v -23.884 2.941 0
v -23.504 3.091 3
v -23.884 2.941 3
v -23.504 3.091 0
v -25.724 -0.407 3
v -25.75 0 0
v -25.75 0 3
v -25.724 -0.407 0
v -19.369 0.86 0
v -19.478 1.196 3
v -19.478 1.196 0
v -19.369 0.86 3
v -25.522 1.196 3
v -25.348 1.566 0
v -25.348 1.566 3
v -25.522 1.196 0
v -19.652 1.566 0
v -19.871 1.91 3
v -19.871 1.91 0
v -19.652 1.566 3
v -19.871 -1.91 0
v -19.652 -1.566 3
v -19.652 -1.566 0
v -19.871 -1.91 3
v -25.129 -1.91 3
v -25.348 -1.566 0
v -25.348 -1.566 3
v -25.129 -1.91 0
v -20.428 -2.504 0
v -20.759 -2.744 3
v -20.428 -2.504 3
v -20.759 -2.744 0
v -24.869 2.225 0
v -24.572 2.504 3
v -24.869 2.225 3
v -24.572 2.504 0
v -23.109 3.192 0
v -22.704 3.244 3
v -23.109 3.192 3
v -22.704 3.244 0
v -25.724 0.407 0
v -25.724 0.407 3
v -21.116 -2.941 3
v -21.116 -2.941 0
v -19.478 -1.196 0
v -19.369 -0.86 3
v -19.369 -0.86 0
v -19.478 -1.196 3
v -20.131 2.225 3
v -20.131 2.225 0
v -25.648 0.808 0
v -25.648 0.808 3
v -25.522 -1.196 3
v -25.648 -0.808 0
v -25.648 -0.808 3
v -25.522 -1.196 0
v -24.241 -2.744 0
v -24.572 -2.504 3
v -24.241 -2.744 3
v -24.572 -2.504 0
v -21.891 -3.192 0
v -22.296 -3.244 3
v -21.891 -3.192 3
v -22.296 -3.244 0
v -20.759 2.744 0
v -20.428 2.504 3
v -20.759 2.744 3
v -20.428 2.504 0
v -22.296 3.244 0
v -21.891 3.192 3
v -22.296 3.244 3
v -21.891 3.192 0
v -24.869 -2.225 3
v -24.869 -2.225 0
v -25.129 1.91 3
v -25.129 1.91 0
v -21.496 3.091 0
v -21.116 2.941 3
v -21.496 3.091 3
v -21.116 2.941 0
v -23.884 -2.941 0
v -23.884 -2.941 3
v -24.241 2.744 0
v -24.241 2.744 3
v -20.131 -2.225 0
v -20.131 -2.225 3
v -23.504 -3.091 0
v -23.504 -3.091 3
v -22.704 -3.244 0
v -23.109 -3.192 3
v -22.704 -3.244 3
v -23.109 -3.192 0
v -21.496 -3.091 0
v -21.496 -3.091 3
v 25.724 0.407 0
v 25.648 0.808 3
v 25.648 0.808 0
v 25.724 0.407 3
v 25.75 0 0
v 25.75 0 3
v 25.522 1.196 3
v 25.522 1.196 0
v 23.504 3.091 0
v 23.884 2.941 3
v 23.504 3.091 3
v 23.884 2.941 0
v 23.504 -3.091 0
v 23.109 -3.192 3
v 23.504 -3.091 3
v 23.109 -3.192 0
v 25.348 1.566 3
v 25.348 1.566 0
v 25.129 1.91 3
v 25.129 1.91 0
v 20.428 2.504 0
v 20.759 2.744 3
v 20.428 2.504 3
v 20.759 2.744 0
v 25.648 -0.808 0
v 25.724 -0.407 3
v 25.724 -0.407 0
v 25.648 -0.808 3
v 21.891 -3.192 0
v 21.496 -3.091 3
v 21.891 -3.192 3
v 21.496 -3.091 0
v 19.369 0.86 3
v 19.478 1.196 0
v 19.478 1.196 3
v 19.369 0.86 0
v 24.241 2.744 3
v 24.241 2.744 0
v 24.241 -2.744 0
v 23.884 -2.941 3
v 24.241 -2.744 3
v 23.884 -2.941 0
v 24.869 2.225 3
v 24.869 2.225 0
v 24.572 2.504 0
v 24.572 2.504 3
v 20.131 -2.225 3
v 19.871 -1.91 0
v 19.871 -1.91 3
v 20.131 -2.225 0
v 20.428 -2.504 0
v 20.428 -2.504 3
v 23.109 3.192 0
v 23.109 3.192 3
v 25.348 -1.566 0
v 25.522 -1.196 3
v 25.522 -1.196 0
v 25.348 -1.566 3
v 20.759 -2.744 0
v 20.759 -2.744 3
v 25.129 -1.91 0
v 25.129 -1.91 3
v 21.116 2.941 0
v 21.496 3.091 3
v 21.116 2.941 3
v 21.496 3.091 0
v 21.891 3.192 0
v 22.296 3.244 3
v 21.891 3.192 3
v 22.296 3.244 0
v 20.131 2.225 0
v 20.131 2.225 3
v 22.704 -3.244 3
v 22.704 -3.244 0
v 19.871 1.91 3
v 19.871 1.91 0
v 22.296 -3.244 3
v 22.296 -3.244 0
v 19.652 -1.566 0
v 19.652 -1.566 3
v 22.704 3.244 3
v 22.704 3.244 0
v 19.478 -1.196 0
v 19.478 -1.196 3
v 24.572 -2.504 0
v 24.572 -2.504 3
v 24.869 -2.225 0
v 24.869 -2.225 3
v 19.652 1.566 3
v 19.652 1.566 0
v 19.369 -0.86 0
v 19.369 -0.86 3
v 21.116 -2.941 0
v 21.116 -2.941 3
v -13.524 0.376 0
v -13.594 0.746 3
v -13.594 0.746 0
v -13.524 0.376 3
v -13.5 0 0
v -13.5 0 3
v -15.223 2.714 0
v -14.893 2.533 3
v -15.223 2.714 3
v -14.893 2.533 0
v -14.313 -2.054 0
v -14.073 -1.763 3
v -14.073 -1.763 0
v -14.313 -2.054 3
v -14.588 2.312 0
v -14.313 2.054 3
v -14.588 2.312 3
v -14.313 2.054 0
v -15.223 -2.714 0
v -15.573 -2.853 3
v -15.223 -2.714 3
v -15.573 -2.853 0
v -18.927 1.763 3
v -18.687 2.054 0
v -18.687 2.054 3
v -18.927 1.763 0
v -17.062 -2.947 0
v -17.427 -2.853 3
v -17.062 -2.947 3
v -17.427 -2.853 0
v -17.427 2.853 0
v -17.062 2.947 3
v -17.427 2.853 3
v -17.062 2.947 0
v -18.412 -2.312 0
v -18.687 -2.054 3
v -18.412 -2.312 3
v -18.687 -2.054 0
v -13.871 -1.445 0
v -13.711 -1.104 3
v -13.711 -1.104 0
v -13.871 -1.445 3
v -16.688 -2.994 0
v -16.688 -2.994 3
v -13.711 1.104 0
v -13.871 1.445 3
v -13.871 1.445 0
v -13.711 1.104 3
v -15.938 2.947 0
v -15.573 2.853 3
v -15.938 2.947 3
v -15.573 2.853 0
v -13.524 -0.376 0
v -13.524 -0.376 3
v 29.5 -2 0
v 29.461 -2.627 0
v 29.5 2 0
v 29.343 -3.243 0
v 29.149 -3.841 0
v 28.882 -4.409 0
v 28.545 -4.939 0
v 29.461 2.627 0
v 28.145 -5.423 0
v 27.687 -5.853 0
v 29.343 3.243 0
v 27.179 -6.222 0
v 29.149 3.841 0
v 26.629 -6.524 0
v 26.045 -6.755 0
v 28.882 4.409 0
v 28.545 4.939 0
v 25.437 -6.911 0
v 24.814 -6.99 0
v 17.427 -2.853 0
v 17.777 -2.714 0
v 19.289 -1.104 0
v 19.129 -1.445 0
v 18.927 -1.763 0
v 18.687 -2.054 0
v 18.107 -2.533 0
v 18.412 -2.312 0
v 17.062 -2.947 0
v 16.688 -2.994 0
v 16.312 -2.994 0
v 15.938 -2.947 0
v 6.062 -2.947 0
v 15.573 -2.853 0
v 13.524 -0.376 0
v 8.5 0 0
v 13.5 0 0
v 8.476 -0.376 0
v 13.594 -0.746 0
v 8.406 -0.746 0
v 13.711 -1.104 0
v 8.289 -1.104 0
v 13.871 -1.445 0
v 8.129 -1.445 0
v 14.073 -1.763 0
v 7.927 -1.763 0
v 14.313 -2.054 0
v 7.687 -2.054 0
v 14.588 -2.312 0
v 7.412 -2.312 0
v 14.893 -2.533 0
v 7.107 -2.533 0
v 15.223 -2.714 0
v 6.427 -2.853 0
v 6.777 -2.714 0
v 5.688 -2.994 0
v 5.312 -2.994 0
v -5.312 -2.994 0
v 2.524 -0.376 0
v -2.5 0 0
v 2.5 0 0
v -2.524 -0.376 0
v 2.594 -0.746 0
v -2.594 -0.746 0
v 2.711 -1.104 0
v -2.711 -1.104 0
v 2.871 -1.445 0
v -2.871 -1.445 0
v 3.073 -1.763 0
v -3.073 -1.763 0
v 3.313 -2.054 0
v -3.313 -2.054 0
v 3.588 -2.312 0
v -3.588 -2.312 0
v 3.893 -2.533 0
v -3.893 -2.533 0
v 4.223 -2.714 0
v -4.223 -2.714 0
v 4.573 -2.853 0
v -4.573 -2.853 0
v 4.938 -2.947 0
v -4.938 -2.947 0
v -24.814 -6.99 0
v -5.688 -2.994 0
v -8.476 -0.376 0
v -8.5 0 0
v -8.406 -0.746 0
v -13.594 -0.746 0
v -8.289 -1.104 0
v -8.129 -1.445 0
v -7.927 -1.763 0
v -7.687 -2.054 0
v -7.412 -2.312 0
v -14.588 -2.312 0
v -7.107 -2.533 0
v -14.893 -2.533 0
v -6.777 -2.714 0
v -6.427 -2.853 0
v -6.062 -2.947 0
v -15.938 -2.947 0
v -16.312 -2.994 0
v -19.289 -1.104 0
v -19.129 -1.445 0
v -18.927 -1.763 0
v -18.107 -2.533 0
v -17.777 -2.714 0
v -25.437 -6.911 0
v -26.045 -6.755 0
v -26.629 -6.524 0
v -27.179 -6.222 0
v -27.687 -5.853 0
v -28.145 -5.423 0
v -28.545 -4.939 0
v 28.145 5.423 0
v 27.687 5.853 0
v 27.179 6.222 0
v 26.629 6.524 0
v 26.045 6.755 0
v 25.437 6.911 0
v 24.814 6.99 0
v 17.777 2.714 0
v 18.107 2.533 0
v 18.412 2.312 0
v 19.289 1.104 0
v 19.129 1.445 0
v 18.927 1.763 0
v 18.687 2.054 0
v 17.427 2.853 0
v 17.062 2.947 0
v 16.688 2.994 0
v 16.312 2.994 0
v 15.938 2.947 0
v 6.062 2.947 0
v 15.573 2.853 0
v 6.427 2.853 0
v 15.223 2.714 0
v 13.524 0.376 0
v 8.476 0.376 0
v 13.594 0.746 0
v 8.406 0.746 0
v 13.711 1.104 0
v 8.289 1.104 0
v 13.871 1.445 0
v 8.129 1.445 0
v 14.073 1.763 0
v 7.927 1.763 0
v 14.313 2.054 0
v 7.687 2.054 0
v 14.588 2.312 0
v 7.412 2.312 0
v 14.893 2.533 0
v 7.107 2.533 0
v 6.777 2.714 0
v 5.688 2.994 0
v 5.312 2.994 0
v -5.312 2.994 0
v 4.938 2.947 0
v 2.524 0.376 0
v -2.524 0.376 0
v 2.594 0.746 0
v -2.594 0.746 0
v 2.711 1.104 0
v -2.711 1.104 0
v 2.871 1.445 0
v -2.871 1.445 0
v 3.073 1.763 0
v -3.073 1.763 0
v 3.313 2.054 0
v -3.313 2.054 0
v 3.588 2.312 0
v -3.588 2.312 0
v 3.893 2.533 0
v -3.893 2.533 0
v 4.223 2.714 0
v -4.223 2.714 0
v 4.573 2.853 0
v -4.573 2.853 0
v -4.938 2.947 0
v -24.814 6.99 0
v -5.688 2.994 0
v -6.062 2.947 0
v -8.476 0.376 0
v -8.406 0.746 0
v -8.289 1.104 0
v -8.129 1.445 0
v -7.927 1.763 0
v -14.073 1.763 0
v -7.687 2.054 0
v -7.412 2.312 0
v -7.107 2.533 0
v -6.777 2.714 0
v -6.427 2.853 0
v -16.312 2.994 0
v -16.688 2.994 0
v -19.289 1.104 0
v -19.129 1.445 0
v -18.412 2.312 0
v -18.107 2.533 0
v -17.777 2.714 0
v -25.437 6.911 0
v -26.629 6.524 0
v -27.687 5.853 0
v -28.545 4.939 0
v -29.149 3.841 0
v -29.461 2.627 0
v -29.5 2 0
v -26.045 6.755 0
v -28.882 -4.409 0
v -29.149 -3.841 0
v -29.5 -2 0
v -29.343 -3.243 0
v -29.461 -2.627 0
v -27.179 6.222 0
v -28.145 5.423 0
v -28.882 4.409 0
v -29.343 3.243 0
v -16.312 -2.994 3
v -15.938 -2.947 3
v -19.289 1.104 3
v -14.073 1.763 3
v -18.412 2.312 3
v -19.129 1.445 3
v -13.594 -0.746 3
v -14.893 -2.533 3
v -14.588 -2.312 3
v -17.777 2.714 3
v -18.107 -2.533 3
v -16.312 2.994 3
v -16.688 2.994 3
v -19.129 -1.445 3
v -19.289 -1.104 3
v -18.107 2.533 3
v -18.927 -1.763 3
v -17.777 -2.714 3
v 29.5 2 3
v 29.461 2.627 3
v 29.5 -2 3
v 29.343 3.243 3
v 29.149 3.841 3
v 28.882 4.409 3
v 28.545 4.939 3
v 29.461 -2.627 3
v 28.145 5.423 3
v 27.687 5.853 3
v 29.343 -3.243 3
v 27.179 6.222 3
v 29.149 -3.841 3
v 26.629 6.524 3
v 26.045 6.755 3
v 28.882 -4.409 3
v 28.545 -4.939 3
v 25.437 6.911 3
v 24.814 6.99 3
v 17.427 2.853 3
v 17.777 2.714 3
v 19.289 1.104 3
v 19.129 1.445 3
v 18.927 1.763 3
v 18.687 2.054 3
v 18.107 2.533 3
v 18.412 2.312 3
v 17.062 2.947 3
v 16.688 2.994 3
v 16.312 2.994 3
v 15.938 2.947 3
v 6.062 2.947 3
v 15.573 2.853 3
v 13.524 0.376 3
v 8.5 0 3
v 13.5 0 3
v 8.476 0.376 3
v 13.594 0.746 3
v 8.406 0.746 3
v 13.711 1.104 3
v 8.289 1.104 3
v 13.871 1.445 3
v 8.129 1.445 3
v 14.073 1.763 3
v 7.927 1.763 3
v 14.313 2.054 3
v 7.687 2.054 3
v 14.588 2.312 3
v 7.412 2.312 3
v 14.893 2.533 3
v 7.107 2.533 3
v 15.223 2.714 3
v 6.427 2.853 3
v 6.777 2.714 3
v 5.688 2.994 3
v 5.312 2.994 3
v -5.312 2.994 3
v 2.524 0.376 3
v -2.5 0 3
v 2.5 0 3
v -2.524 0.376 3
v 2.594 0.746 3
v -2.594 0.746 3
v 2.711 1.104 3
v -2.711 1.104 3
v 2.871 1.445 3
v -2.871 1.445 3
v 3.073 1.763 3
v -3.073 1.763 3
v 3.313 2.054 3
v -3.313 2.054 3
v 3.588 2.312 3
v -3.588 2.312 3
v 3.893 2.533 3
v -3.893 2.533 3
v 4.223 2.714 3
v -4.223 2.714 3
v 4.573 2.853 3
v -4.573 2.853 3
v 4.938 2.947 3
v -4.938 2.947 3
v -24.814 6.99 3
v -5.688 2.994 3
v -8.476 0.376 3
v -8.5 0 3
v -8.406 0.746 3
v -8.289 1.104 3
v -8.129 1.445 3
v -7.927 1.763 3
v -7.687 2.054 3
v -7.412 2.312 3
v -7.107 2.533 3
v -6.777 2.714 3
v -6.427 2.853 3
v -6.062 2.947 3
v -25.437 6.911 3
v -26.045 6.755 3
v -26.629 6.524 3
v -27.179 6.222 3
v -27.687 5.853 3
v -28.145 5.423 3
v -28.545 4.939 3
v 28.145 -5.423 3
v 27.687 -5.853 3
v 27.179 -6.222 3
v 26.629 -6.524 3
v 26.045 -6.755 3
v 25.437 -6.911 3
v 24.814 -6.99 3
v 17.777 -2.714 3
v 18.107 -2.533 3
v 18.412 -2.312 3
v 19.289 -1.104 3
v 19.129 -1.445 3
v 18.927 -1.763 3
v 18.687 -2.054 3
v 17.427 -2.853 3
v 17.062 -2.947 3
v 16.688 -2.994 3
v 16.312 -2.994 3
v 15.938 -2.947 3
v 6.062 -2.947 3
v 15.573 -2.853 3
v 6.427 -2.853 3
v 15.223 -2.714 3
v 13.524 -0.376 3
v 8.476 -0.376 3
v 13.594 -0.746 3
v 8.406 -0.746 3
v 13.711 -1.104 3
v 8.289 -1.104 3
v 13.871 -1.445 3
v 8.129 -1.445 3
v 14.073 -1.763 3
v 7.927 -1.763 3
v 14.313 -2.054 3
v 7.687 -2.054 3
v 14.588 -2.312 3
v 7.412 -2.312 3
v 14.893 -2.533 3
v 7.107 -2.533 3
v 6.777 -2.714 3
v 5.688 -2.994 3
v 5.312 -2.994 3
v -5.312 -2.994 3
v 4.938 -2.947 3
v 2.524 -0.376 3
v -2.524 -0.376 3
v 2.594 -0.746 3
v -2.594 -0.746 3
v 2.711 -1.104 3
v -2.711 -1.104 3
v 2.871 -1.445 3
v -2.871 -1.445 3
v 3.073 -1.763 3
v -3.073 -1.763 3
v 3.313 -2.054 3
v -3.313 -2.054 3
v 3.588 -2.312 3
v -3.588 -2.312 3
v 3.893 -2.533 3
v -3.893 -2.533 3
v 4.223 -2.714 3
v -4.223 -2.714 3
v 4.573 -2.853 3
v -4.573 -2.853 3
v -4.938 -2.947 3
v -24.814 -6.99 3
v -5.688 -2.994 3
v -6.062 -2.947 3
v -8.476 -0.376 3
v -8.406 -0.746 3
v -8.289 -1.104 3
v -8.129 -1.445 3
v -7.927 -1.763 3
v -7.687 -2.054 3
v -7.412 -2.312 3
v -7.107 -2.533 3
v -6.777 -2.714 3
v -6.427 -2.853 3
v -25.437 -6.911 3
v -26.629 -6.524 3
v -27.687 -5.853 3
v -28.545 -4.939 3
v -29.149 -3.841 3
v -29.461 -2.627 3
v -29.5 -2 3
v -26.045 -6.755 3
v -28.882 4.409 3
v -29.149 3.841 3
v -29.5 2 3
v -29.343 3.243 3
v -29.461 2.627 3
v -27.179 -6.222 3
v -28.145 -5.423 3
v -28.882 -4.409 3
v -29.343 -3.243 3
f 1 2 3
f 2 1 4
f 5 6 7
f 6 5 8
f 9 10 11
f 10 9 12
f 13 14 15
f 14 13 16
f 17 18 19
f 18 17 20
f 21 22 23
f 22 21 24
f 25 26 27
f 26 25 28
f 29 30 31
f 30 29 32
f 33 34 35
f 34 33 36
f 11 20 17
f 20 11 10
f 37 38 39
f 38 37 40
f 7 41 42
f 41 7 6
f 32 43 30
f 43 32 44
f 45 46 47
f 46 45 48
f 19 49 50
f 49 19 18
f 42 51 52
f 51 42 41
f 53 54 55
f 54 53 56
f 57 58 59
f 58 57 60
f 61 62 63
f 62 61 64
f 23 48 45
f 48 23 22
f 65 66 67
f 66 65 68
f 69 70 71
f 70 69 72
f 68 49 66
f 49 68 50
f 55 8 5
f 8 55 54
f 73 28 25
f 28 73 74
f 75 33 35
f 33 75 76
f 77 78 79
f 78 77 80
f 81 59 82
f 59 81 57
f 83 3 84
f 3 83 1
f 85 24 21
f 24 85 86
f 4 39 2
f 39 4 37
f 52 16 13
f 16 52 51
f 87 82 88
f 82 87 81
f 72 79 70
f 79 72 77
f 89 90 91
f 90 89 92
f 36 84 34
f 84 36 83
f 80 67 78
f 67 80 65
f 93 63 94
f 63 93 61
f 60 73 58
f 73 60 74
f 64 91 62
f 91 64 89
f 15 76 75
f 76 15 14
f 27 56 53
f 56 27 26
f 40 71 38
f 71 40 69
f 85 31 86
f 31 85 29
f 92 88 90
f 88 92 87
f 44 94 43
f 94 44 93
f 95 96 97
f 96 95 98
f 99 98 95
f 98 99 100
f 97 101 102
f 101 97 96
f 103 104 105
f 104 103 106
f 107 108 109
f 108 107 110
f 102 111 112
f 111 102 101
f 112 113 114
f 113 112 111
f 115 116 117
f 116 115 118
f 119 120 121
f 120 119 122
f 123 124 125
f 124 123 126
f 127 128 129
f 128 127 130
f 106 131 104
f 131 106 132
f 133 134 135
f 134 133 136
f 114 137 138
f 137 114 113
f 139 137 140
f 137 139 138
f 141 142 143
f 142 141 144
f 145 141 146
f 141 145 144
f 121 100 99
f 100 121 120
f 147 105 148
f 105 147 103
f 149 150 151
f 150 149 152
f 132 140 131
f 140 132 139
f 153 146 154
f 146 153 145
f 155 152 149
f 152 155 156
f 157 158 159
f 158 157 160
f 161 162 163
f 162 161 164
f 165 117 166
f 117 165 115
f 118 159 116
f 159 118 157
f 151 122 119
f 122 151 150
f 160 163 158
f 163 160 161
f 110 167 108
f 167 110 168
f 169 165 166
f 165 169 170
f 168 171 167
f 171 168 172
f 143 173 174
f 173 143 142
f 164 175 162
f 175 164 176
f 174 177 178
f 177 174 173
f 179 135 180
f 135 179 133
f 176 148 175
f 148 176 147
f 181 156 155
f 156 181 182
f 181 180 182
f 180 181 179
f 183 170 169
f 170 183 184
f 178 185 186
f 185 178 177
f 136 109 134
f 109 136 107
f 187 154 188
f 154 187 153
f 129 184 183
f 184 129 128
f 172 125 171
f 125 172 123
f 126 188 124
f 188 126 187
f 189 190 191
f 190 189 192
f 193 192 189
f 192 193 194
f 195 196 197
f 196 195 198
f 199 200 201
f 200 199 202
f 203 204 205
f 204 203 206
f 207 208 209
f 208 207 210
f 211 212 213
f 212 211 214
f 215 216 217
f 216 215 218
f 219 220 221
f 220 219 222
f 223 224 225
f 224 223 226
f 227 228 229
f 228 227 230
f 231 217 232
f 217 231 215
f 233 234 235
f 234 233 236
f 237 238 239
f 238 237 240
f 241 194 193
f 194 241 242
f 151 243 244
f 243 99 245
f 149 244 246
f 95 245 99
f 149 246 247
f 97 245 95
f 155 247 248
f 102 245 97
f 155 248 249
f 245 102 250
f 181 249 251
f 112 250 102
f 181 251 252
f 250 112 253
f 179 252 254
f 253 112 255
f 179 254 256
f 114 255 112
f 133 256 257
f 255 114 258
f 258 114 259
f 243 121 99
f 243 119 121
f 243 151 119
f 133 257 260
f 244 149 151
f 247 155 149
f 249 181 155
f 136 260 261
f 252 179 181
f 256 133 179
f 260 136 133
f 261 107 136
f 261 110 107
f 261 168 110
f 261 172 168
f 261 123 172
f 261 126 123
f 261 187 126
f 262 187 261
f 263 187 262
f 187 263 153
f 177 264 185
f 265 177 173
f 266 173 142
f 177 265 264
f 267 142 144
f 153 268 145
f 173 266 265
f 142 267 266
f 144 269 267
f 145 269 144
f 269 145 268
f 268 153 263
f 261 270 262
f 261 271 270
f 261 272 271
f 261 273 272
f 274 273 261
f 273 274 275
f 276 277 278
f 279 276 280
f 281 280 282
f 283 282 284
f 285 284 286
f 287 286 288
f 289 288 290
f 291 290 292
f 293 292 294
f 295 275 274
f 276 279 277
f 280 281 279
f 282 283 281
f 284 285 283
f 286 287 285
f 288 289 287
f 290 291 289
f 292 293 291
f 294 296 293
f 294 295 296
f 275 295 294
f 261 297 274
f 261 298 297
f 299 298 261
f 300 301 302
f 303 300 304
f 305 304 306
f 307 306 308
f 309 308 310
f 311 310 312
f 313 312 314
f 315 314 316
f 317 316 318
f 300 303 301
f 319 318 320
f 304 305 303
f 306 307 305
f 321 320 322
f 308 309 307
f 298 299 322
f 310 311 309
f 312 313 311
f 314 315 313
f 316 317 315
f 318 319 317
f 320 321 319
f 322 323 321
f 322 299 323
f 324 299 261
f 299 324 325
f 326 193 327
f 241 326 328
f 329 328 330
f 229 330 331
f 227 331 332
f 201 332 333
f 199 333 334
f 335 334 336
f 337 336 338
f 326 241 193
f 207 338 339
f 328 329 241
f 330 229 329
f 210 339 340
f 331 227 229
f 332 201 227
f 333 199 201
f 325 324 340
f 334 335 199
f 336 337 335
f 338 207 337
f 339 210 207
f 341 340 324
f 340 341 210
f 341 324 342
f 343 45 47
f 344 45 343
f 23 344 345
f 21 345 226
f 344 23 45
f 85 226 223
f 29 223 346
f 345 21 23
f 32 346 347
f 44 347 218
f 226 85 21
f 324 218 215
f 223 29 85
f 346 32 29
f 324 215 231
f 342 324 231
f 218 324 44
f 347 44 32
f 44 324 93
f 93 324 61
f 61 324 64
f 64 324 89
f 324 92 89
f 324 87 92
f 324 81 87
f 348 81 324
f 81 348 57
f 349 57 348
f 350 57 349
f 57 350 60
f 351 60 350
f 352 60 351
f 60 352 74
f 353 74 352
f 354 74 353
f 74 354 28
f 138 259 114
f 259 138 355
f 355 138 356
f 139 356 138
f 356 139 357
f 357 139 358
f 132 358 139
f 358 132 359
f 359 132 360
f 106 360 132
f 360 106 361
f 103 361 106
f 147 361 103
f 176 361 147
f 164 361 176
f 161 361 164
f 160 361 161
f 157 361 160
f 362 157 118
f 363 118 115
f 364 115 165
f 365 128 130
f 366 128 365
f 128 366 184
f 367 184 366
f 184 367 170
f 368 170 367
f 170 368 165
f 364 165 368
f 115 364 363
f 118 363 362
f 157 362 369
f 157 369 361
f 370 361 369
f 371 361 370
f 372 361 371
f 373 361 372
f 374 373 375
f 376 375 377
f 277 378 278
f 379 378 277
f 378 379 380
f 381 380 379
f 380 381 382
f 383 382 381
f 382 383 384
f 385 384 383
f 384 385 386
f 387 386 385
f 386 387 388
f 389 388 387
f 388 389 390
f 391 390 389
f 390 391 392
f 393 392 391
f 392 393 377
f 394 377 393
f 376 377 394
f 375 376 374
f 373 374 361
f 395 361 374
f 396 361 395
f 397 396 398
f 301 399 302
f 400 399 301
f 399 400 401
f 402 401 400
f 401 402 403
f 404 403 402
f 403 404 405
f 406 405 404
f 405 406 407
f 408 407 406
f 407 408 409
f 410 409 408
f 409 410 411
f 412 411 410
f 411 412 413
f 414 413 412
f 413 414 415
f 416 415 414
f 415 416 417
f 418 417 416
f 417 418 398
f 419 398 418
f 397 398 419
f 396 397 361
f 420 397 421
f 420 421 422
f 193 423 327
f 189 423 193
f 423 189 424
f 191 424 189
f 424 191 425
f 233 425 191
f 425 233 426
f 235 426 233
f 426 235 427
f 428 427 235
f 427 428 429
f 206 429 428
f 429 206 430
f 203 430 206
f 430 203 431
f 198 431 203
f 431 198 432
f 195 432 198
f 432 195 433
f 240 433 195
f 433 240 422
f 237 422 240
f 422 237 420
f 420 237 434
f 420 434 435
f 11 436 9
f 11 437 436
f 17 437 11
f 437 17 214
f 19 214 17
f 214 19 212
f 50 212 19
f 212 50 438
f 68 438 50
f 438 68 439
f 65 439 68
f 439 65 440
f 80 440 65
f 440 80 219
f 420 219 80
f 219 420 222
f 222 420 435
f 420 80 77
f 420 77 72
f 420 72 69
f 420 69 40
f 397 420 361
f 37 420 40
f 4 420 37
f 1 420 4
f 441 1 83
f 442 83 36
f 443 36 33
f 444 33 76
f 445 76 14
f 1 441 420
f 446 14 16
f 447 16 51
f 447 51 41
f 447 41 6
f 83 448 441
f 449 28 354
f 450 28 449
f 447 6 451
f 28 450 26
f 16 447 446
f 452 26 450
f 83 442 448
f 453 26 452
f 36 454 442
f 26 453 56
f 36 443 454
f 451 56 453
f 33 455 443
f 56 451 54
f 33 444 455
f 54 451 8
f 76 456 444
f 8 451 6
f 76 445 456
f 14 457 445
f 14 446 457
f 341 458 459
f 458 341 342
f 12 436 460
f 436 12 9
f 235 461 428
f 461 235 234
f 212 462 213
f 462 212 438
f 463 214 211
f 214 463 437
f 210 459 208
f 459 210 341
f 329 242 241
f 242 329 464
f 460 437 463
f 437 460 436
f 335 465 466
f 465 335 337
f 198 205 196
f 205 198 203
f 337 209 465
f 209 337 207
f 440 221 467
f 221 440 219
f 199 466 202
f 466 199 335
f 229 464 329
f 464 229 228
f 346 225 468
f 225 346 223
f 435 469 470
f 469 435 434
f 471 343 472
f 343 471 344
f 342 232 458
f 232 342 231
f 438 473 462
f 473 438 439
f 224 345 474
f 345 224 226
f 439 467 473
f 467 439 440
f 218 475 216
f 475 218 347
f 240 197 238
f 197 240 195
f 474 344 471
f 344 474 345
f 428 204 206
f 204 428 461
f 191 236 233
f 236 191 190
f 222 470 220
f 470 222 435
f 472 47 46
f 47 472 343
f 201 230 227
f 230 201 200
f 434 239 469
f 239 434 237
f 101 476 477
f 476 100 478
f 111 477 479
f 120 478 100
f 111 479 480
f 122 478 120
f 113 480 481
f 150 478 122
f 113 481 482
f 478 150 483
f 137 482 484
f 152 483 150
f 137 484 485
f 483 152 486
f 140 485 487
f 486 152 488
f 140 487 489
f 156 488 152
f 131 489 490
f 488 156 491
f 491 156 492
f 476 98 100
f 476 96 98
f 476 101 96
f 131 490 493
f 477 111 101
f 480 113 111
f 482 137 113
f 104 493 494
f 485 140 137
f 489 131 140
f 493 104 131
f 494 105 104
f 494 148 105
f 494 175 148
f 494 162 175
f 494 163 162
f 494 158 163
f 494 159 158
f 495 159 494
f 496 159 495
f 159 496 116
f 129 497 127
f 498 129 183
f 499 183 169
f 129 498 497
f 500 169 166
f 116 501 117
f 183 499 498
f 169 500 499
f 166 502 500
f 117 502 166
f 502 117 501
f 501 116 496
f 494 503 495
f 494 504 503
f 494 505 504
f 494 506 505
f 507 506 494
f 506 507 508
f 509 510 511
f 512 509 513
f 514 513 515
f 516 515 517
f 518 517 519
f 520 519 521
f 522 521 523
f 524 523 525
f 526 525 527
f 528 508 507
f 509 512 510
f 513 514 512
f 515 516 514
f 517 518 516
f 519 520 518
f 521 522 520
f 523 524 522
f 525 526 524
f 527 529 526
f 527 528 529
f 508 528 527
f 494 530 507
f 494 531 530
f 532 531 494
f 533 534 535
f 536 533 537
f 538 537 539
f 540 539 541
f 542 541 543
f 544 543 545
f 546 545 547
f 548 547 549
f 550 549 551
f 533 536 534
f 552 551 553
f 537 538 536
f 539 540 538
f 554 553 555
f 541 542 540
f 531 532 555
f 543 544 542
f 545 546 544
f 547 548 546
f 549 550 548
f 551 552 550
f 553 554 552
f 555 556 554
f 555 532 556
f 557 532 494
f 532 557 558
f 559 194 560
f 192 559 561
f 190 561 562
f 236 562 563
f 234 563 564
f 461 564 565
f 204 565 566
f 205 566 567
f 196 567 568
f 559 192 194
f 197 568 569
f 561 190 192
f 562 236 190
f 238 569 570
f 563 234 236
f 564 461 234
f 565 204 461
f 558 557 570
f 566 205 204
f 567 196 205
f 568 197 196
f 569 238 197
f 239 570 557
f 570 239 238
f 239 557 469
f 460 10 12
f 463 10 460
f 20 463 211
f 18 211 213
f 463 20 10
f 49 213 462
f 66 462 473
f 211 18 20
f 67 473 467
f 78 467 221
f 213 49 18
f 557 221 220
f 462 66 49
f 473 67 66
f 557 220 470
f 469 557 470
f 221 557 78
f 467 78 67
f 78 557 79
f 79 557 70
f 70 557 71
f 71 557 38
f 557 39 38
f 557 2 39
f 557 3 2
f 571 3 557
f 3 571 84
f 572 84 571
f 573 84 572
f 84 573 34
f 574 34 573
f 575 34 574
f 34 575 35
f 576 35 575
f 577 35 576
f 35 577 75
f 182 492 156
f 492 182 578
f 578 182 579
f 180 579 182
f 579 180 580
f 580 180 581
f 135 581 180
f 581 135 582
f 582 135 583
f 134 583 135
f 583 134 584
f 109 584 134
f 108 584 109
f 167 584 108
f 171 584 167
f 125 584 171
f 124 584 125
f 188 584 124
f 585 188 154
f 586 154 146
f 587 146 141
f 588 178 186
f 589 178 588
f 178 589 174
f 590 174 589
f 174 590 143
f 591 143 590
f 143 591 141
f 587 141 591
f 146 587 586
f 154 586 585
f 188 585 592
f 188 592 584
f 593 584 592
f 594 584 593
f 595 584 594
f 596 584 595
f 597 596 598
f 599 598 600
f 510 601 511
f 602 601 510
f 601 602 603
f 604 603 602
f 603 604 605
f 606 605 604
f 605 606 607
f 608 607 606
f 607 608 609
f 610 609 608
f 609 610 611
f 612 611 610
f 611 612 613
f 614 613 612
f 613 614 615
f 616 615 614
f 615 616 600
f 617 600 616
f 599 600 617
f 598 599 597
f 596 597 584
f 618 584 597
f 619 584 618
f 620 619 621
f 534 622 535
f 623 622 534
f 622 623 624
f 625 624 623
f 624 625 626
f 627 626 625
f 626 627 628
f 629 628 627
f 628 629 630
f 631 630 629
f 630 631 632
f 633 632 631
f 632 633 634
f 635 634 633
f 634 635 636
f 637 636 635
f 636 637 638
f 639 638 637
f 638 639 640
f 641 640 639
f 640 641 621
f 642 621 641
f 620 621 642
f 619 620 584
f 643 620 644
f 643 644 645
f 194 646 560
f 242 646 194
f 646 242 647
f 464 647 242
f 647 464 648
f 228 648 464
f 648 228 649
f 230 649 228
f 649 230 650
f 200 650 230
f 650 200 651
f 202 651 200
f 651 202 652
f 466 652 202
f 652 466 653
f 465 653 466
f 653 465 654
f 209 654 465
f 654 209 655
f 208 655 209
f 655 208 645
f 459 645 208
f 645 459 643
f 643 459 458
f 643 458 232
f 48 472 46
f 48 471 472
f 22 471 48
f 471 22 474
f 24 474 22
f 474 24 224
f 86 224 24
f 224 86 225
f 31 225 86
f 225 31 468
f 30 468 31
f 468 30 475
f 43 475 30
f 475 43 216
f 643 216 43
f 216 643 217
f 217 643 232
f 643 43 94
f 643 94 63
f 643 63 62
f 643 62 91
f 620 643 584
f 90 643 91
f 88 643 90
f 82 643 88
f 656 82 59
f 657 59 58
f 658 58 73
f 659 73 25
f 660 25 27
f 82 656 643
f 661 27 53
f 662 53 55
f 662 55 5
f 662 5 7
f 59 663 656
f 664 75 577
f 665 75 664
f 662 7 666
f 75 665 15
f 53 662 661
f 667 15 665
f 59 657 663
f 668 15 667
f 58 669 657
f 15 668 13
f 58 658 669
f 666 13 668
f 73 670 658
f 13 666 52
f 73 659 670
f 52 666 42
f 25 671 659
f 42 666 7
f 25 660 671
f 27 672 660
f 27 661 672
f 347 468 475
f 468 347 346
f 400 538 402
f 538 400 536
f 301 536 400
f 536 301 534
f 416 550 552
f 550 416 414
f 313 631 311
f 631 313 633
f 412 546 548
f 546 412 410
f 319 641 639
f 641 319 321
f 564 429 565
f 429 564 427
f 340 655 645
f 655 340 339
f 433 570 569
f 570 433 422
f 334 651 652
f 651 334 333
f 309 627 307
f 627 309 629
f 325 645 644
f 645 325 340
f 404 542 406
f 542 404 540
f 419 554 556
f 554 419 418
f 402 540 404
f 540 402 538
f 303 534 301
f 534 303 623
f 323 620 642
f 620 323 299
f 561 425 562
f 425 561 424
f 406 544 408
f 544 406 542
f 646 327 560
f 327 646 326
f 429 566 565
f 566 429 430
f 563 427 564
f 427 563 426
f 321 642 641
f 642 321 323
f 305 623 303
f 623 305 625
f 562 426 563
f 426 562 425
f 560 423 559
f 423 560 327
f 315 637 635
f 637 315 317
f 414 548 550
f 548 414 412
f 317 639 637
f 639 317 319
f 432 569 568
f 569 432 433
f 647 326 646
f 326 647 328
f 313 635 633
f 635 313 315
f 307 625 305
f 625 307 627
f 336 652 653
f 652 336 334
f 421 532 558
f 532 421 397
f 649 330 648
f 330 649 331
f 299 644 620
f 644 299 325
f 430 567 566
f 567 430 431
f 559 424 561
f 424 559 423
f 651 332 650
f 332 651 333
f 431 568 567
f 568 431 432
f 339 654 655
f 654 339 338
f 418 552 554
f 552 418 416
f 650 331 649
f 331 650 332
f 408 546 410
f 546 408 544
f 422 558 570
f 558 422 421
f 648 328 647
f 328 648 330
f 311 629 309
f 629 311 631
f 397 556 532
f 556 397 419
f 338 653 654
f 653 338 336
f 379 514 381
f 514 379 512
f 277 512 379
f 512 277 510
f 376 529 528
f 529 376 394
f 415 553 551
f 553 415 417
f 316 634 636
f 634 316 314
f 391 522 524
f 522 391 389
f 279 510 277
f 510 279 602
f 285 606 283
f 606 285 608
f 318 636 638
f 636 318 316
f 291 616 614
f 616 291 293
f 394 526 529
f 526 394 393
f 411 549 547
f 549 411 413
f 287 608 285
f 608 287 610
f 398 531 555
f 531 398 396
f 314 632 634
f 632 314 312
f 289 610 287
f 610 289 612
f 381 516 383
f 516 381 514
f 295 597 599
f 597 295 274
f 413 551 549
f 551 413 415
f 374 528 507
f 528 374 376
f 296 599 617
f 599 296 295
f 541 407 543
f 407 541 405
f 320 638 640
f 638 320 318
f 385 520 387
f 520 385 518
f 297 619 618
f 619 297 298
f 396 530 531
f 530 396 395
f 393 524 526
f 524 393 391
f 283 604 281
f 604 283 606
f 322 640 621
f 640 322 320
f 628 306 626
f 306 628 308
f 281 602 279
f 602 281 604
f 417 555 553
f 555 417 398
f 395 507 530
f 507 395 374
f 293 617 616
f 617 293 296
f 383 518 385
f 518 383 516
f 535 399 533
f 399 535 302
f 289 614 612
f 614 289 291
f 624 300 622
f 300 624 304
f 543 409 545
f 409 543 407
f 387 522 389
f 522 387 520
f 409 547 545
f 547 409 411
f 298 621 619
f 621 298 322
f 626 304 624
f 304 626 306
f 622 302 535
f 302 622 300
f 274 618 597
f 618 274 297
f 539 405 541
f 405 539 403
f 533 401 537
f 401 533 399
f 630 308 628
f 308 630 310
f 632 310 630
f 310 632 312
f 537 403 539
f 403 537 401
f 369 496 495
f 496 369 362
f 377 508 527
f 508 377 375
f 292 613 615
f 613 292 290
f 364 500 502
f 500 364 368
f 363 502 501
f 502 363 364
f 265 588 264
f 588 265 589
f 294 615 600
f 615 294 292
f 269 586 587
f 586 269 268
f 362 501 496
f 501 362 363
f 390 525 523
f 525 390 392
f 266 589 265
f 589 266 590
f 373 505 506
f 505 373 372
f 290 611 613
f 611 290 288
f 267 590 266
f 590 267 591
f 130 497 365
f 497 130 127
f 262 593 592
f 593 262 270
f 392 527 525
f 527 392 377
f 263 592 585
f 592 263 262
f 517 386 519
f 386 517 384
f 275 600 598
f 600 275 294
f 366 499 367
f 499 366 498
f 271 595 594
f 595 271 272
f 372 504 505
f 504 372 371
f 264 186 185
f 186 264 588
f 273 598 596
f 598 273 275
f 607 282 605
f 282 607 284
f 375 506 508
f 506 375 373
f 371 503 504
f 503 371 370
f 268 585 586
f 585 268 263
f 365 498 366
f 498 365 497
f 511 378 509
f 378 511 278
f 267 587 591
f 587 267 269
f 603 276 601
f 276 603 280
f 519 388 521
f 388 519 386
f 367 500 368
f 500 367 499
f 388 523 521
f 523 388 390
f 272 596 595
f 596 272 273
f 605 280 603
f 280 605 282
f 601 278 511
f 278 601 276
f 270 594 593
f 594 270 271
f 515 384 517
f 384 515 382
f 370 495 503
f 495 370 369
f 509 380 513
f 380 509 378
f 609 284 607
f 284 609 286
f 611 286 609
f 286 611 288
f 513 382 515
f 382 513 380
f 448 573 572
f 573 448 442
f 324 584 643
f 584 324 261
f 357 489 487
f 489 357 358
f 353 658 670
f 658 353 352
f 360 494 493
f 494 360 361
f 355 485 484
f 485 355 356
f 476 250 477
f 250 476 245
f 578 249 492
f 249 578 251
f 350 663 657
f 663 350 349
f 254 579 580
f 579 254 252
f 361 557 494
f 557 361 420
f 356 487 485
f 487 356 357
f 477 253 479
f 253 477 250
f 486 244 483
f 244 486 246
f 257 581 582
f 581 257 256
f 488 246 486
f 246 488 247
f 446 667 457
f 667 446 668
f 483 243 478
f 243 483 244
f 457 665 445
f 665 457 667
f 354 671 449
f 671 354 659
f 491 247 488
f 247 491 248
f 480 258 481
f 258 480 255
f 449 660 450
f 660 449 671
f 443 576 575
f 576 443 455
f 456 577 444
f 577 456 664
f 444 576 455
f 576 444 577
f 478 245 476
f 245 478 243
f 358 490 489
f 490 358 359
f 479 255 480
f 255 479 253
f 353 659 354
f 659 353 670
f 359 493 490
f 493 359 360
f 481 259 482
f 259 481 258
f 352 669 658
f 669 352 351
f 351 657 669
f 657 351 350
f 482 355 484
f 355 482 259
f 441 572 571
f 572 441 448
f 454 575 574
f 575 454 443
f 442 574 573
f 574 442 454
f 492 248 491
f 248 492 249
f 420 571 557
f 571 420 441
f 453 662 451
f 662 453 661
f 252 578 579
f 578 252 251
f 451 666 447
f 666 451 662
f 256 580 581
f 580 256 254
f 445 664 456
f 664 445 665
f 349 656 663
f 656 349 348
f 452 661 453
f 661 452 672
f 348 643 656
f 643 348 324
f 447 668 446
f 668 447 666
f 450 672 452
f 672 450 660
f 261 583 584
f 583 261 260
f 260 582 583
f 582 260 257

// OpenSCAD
$fn = 50;


difference() {
	union() {
		hull() {
			translate(v = [-24.5000000000, 2.0000000000, 0]) {
				cylinder(h = 3, r = 5);
			}
			translate(v = [24.5000000000, 2.0000000000, 0]) {
				cylinder(h = 3, r = 5);
			}
			translate(v = [-24.5000000000, -2.0000000000, 0]) {
				cylinder(h = 3, r = 5);
			}
			translate(v = [24.5000000000, -2.0000000000, 0]) {
				cylinder(h = 3, r = 5);
			}
		}
	}
	union() {
		#translate(v = [-22.5000000000, 0.0000000000, -100.0000000000]) {
			cylinder(h = 200, r = 3.2500000000);
		}
		#translate(v = [-22.5000000000, 0.0000000000, -100.0000000000]) {
			cylinder(h = 200, r = 3.2500000000);
		}
		#translate(v = [22.5000000000, 0.0000000000, -100.0000000000]) {
			cylinder(h = 200, r = 3.2500000000);
		}
		#translate(v = [22.5000000000, 0.0000000000, -100.0000000000]) {
			cylinder(h = 200, r = 3.2500000000);
		}
		#translate(v = [-16.5000000000, 0, 0]) {
			cylinder(h = 3, r = 3.0000000000);
		}
		#translate(v = [-5.5000000000, 0, 0]) {
			cylinder(h = 3, r = 3.0000000000);
		}
		#translate(v = [5.5000000000, 0, 0]) {
			cylinder(h = 3, r = 3.0000000000);
		}
		#translate(v = [16.5000000000, 0, 0]) {
			cylinder(h = 3, r = 3.0000000000);
		}
	}
}
